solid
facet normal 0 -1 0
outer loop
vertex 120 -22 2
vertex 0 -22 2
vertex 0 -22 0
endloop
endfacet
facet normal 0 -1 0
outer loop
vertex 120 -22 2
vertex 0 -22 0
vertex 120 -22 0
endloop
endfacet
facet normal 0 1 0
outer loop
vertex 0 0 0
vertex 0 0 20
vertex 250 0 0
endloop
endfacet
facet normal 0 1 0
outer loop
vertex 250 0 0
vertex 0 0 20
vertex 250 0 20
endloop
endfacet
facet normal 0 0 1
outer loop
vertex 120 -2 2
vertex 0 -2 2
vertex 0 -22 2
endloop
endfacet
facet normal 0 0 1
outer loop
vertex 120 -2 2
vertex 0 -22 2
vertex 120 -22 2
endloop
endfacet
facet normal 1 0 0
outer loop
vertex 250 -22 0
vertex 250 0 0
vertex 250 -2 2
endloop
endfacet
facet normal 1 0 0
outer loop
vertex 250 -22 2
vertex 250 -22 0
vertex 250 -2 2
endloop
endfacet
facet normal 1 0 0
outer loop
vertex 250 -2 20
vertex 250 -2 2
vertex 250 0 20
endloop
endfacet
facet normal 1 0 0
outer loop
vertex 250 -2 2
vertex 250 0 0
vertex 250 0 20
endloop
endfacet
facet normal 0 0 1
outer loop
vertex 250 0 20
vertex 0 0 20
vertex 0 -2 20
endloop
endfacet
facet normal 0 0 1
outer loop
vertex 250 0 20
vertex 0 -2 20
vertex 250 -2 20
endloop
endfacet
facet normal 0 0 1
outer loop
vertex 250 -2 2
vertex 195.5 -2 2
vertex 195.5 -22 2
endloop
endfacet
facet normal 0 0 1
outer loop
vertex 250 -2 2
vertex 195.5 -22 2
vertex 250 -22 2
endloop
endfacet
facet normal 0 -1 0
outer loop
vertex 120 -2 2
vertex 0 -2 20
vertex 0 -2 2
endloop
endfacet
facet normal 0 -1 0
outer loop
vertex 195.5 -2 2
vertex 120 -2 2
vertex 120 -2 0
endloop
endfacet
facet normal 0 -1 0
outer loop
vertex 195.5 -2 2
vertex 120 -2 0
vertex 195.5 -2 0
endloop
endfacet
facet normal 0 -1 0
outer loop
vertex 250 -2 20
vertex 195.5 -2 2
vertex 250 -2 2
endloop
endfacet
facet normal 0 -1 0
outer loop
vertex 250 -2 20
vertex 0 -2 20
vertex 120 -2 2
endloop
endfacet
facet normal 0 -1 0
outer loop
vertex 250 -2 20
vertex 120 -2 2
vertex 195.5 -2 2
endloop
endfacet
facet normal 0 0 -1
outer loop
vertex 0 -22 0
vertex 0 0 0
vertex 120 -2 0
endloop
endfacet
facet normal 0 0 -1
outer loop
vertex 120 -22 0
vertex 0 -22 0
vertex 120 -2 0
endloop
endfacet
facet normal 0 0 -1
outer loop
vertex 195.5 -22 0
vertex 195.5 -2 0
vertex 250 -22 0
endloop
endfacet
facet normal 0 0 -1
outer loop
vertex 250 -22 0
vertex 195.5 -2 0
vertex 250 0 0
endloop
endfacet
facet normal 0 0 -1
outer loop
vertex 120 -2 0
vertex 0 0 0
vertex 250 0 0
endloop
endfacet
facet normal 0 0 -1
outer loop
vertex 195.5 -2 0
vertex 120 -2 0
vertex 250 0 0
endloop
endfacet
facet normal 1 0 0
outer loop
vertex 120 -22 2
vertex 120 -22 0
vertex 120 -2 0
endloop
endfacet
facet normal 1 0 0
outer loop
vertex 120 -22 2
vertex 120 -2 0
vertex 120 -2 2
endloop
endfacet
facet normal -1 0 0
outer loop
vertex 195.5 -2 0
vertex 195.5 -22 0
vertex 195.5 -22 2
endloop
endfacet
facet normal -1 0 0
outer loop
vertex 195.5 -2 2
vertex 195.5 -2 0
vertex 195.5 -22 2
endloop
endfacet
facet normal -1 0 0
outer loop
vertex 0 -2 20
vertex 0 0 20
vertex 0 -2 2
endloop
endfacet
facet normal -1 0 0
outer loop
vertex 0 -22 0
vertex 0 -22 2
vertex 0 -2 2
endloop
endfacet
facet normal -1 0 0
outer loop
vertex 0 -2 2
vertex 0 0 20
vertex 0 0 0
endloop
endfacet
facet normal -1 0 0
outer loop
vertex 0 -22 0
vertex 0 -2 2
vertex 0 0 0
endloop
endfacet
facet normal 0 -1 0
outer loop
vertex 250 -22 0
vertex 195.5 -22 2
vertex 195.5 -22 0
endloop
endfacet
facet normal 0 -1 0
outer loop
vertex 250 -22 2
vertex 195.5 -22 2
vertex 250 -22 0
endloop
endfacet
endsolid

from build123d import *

# Parameters (mm, degrees)
F0_W     = 250
F0_H     = 2
F0_H_2   = 18
F1_DEPTH = 2
F2_DEPTH = 22
F3_W     = 75.5
F3_H     = 2
F4_DEPTH = 20


with BuildPart() as f1:
    # F0 (on Front) → F1 (new body)
    with BuildSketch(Plane.XZ):
        with Locations((125, 1)):
            Rectangle(F0_W, F0_H)
        with Locations((125, 11)):
            Rectangle(F0_W, F0_H_2)
    extrude(amount=F1_DEPTH)

    # F0 (on Front) → F2 (join)
    with BuildSketch(Plane.XZ):
        with Locations((125, 1)):
            Rectangle(F0_W, F0_H)
    extrude(amount=F2_DEPTH)

    # F3 (on face) → F4 (cut, through all)
    with BuildSketch(Plane.XZ.offset(22)):
        with Locations((157.75, 1)):
            Rectangle(F3_W, F3_H)
    extrude(amount=-F4_DEPTH, mode=Mode.SUBTRACT)


solid = f1.part
